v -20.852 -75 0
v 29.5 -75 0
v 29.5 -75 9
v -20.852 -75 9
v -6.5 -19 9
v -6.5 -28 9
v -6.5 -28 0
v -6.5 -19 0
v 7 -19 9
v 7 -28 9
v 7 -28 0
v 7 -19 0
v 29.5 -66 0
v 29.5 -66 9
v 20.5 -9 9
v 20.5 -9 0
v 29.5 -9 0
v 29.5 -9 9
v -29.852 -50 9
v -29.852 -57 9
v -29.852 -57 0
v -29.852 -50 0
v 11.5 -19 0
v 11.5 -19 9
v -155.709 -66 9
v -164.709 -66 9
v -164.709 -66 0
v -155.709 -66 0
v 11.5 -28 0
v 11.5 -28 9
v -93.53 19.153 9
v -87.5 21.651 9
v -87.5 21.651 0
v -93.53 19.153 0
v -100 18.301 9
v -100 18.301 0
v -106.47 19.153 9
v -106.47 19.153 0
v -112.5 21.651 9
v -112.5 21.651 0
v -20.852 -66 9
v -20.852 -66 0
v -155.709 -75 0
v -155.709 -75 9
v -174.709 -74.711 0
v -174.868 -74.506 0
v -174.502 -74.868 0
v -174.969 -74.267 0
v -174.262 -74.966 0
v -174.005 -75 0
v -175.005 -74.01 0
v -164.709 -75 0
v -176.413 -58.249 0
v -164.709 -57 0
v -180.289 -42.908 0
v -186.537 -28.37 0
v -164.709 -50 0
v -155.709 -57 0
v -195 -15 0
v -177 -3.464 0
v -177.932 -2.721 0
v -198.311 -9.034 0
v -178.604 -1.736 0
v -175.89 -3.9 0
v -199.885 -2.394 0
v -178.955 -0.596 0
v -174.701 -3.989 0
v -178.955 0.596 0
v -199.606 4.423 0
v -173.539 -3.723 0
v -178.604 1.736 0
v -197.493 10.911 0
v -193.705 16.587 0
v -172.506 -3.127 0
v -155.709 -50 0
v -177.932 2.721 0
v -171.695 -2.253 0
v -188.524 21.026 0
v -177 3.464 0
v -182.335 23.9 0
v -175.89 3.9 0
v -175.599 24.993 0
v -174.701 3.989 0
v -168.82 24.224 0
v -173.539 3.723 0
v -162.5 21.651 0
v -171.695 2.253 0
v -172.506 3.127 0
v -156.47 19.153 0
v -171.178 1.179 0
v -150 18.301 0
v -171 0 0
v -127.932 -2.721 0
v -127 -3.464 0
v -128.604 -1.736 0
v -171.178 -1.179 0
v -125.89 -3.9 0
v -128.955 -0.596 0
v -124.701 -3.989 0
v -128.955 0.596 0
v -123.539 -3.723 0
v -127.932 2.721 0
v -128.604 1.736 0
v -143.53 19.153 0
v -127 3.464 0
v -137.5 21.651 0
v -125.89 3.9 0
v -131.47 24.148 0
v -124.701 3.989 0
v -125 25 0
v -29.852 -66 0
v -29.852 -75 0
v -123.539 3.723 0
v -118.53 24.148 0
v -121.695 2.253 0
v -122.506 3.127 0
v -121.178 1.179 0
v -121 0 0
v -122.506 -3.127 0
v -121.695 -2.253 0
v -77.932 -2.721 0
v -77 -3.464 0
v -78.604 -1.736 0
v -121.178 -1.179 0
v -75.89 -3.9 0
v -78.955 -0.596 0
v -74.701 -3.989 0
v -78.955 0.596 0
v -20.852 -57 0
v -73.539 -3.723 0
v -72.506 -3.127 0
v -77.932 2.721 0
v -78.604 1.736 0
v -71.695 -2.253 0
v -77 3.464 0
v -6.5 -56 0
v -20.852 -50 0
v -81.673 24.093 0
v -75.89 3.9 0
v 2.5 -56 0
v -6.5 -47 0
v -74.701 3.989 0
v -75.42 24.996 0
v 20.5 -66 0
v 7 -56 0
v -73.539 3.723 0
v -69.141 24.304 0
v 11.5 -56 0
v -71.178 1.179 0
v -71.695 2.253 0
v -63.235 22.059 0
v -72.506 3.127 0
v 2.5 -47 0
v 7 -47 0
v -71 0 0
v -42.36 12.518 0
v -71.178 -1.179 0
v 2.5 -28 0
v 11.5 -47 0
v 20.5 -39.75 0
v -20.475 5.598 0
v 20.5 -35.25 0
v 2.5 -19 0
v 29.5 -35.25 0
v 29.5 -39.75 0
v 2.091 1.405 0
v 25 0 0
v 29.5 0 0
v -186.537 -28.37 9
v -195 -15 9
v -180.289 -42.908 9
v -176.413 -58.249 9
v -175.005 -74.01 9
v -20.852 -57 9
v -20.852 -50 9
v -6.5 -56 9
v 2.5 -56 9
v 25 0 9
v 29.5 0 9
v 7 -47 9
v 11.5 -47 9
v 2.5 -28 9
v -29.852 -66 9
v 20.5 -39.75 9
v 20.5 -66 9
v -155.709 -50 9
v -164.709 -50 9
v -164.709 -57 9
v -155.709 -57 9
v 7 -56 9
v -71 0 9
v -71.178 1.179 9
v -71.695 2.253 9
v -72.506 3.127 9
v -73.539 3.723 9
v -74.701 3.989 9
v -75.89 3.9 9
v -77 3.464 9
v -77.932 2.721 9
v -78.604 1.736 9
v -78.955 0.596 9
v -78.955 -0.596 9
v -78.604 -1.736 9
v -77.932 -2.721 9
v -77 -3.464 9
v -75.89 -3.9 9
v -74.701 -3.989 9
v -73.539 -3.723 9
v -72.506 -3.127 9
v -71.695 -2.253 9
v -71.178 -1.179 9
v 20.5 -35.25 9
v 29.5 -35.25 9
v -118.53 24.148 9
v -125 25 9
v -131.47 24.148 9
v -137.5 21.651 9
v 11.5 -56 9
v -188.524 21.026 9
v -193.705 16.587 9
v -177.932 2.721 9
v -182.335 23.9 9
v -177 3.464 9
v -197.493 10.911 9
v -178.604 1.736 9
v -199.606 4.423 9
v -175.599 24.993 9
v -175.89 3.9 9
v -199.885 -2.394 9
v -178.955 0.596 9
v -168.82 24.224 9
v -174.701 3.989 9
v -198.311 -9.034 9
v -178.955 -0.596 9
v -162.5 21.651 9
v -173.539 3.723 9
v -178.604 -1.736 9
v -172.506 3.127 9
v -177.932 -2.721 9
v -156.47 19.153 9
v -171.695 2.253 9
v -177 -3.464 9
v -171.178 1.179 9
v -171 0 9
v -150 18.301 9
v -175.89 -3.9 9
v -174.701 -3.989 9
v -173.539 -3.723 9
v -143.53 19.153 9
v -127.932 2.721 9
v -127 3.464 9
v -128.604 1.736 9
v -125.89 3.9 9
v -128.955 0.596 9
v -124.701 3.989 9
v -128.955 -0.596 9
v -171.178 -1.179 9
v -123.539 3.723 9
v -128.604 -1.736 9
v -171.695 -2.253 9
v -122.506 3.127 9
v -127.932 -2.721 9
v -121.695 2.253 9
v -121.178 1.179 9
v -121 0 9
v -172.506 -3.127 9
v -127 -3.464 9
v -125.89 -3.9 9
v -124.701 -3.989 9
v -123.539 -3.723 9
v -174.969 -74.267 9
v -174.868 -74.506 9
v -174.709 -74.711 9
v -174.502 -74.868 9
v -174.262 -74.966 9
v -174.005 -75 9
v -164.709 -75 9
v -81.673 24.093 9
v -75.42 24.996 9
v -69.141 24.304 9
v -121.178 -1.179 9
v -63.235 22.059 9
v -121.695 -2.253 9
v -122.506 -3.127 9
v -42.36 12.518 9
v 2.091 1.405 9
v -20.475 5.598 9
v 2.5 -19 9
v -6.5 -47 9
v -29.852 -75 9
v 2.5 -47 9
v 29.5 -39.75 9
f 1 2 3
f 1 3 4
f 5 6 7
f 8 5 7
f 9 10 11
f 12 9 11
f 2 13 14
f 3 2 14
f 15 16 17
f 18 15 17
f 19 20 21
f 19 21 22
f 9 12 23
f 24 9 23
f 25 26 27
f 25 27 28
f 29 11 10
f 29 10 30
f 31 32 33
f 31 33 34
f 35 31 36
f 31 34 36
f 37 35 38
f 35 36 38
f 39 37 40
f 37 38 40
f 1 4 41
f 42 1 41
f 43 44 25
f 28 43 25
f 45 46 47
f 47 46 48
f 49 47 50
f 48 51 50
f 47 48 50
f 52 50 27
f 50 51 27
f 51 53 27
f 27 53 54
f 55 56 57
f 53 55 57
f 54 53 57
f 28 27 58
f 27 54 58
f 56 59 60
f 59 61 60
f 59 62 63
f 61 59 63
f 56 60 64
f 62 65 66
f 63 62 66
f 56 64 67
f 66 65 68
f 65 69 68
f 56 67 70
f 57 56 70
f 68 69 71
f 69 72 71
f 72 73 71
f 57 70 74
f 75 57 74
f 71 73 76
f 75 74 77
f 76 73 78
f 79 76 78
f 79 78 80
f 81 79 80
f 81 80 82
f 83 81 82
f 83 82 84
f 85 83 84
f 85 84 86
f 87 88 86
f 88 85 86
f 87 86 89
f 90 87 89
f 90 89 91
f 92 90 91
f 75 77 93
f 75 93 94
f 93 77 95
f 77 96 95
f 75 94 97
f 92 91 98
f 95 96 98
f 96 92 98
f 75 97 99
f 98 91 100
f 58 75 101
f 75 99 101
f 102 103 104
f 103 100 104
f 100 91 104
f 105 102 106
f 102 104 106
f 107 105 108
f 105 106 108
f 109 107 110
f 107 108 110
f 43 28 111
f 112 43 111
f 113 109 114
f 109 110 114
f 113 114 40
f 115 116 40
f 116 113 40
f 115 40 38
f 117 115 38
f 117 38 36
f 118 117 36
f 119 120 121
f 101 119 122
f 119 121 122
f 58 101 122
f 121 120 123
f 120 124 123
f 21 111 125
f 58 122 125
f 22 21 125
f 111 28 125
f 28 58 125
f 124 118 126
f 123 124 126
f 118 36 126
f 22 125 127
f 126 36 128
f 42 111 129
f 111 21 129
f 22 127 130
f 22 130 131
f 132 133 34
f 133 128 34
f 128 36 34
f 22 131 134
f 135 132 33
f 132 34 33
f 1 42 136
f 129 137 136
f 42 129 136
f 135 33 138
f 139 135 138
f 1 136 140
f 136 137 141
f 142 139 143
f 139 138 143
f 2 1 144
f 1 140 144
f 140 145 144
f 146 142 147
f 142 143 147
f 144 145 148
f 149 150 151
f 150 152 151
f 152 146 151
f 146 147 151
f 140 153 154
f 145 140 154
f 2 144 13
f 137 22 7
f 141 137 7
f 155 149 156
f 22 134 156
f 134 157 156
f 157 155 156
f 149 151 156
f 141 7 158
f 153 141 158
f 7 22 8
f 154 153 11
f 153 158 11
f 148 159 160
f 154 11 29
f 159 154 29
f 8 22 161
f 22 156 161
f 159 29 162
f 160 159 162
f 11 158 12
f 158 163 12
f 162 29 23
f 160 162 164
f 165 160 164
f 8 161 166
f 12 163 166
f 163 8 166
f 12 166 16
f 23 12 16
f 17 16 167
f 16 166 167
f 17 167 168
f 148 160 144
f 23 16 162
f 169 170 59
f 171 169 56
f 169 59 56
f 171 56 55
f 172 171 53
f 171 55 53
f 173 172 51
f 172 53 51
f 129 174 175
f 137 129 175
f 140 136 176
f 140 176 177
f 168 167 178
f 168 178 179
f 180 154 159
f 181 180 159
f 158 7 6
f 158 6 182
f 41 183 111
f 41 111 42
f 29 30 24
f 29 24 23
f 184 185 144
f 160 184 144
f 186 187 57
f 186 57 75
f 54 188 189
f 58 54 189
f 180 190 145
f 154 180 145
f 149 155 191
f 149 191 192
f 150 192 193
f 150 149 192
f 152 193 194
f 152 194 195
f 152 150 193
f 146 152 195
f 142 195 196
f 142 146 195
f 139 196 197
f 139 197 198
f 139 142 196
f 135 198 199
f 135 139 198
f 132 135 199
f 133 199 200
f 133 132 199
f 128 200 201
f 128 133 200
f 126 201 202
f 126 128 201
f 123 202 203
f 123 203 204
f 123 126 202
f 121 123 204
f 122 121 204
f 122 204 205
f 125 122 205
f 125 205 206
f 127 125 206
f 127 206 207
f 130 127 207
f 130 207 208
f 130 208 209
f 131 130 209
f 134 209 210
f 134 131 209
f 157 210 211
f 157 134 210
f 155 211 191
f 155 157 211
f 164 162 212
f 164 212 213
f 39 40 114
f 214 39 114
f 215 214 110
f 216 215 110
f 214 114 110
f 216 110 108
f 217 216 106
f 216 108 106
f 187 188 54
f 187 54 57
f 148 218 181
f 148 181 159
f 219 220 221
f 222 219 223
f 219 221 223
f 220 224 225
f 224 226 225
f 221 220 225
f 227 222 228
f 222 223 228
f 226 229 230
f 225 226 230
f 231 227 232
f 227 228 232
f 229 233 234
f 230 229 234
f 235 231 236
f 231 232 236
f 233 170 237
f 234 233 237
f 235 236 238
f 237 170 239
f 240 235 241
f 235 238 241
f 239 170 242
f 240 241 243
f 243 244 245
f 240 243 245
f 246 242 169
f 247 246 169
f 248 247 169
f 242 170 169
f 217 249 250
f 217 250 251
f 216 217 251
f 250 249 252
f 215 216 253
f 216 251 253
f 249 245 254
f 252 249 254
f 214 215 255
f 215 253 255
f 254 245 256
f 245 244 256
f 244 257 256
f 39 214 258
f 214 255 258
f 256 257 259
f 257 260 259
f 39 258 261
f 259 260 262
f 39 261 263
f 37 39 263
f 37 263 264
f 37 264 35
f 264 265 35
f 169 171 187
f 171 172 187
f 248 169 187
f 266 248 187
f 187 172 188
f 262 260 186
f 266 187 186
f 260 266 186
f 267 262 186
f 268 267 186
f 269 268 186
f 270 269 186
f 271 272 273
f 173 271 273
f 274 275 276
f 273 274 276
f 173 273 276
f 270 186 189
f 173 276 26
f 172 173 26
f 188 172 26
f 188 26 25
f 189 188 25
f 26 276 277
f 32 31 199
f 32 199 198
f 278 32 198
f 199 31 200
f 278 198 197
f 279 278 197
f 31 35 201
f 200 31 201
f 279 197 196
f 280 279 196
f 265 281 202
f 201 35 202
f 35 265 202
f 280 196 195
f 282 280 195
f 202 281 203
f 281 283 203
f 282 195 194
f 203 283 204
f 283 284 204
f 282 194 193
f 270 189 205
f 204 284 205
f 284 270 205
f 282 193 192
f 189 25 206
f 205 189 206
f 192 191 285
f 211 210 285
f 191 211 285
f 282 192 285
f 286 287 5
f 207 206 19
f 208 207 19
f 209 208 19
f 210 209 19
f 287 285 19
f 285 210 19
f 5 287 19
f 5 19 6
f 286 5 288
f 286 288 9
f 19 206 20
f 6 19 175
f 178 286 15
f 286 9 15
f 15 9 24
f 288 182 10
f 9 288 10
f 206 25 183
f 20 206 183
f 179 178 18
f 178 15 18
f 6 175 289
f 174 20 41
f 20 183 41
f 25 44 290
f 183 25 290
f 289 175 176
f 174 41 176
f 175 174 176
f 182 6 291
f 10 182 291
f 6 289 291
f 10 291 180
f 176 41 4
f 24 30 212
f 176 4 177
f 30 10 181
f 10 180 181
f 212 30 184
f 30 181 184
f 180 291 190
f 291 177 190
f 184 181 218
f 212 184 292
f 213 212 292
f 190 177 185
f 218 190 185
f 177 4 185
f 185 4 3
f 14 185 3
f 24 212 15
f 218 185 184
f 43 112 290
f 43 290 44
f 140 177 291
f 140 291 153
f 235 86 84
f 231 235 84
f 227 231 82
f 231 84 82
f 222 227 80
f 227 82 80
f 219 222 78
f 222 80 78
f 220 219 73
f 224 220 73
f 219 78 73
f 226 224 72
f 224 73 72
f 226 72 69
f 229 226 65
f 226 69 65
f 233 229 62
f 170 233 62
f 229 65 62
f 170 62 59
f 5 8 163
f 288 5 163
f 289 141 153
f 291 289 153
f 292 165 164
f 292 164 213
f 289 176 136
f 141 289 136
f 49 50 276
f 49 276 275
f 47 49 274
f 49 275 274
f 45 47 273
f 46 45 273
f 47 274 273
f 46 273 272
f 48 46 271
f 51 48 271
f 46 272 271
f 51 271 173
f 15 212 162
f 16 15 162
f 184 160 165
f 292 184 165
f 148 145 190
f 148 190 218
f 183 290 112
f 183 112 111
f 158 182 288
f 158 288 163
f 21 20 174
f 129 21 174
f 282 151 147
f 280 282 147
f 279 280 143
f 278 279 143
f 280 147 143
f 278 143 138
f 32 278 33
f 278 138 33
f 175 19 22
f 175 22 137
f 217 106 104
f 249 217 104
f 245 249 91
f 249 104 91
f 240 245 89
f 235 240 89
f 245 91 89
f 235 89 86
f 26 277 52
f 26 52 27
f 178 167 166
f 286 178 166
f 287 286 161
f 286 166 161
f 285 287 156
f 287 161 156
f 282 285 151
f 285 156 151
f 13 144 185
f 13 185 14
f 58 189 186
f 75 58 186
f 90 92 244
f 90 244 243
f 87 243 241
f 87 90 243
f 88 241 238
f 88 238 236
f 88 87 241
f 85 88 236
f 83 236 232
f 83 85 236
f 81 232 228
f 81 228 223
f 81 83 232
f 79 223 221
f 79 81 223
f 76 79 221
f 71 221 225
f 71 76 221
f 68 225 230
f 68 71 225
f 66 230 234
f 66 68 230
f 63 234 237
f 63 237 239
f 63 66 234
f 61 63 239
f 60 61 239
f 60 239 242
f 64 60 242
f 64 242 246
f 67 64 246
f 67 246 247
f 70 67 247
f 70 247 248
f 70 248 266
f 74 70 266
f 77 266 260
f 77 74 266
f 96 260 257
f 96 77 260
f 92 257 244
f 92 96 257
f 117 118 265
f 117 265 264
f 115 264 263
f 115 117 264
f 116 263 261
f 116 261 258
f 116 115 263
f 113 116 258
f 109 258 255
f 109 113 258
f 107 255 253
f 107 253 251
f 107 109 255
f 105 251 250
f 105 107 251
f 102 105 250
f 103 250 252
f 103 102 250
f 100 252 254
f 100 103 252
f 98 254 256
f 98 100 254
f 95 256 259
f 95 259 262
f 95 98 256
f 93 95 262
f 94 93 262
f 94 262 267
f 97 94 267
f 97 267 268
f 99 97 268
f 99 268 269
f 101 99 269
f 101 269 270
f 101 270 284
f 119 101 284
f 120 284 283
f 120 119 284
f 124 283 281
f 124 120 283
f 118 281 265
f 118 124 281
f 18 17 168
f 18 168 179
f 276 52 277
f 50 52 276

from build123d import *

# Parameters (mm, degrees)
SKETCH1_R                = 8
SKETCH1_R_2              = 4
BOSS_EXTRUDE1_DEPTH      = 9
BOSS_EXTRUDE1_2_DEPTH    = 9
SKETCH2_R                = 4
BOSS_EXTRUDE3_DEPTH      = 9
FILLET1_R                = 1
CUT_EXTRUDE1_DEPTH       = 214.789616212
SKETCH4_W                = 9
SKETCH4_H                = 27
BOSS_EXTRUDE4_DEPTH      = 75
BOSS_EXTRUDE5_START      = 9
SKETCH5_R                = 25
SKETCH5_R_2              = 4
BOSS_EXTRUDE5_DEPTH      = 9
BOSS_EXTRUDE6_DEPTH      = 4.5
BOSS_EXTRUDE6_DEPTH_BACK = 4.5
BOSS_EXTRUDE7_DEPTH      = 4.5
BOSS_EXTRUDE7_DEPTH_BACK = 4.5
BOSS_EXTRUDE7_START      = -25
SKETCH9_W                = 9
SKETCH9_H                = 7
SKETCH9_H_2              = 9
CUT_EXTRUDE2_DEPTH       = 217.612557346
CUT_EXTRUDE3_DEPTH       = 216.299790989
CUT_EXTRUDE3_DEPTH_BACK  = 216.299790989
CAVITY1_START            = -66
CAVITY1_OUTLINE_W        = 9
CAVITY1_OUTLINE_H        = 9
CAVITY1_DEPTH            = 26.25
CAVITY1_START_2          = -35.25
CAVITY1_2_OUTLINE_W      = 9
CAVITY1_2_OUTLINE_H      = 9
CAVITY1_2_DEPTH          = 26.25
CAVITY1_START_3          = -56
CAVITY1_3_OUTLINE_W      = 4.5
CAVITY1_3_OUTLINE_H      = 9
CAVITY1_3_OUTLINE_W_2    = 9
CAVITY1_3_DEPTH          = 9
CAVITY1_START_4          = -28
CAVITY1_4_OUTLINE_W      = 4.5
CAVITY1_4_OUTLINE_H      = 9
CAVITY1_4_OUTLINE_W_2    = 9
CAVITY1_4_DEPTH          = 9


# Read off the part's stored shape, not the designer's step: Cavity1
with BuildPart() as part:
    # Sketch1 → Boss-Extrude1 (new body)
    with BuildSketch(Plane.XY):
        with Locations((-125, 0)):
            Circle(SKETCH1_R)
        with Locations((-125, 0)):
            Circle(SKETCH1_R_2, mode=Mode.SUBTRACT)
    extrude(amount=BOSS_EXTRUDE1_DEPTH)



with BuildPart() as body_2:
    # Sketch1 → Boss-Extrude1 2 (new body)
    with BuildSketch(Plane.XY):
        with Locations((125, 0)):
            Circle(SKETCH1_R)
        with Locations((125, 0)):
            Circle(SKETCH1_R_2, mode=Mode.SUBTRACT)
    extrude(amount=BOSS_EXTRUDE1_2_DEPTH)


with BuildPart() as part_1:
    add(part.part)

    add(body_2.part)  # Boss-Extrude3 merges body 2
    # Sketch2 → Boss-Extrude3 (add)
    with BuildSketch(Plane.XY):
        with BuildLine():
            Line((-175, -75), (125, -75))
            ThreePointArc((125, -75), (130.131670325, -43.377223009), (145.000000492, -14.999999344))
            ThreePointArc((145.000000492, -14.999999344), (143.981414944, 16.269784471), (113.235294528, 22.058823748))
            ThreePointArc((113.235294528, 22.058823748), (25.000000075, 0), (-63.235294395, 22.058823677))
            ThreePointArc((-63.235294395, 22.058823677), (-75.420498385, 24.996463372), (-87.499999896, 21.650635154))
            ThreePointArc((-87.499999896, 21.650635154), (-99.999999954, 18.301270189), (-112.500000024, 21.650635108))
            ThreePointArc((-112.500000024, 21.650635108), (-124.99999995, 25), (-137.49999989, 21.650635158))
            ThreePointArc((-137.49999989, 21.650635158), (-149.999999954, 18.301270189), (-162.50000003, 21.650635112))
            ThreePointArc((-162.50000003, 21.650635112), (-193.705072901, 16.586749162), (-195.000000551, -14.999999265))
            ThreePointArc((-195.000000551, -14.999999265), (-180.13167034, -43.377222962), (-175, -75))
        make_face()
        with Locations((125, 0)):
            Circle(SKETCH2_R, mode=Mode.SUBTRACT)
        with Locations((-175, 0)):
            Circle(SKETCH2_R, mode=Mode.SUBTRACT)
        with Locations((-125, 0)):
            Circle(SKETCH2_R, mode=Mode.SUBTRACT)
        with Locations((-75, 0)):
            Circle(SKETCH2_R, mode=Mode.SUBTRACT)
    extrude(amount=BOSS_EXTRUDE3_DEPTH)

    # Fillet1
    fillet1_edges = [part_1.edges().sort_by_distance(p)[0] for p in [
        (-175, -75, 4.5),
        (125, -75, 4.5),
    ]]
    fillet(fillet1_edges, radius=FILLET1_R)

    # Sketch3 → Cut-Extrude1 (cut, through all)
    with BuildSketch(Plane.XY):
        Polygon((25, 0), (25, -75), (150, -75), (150, 25), (25, 25), align=None)
    extrude(amount=CUT_EXTRUDE1_DEPTH, mode=Mode.SUBTRACT)

    # Sketch4 → Boss-Extrude4 (add)
    with BuildSketch(Plane.XZ.offset(75)):
        with Locations((25, -4.5)):
            Rectangle(SKETCH4_W, SKETCH4_H)
    extrude(amount=-BOSS_EXTRUDE4_DEPTH)

    # Sketch5 → Boss-Extrude5 (add)
    # profile 1 of 4: a face of its own
    with BuildSketch(Plane(origin=(0, 0, -18), x_dir=(-1, 0, 0), z_dir=(0, 0, -1)).offset(BOSS_EXTRUDE5_START)):
        with BuildLine():
            ThreePointArc((-145.000000304, -14.999999594), (-130.131670275, -43.377223158), (-125, -75))
            Line((-125, -75), (-29.5, -75))
            Line((-29.5, -75), (-29.5, 0))
            Line((-29.5, 0), (-100, 0))
            ThreePointArc((-100, 0), (-117.09430609, -23.717082532), (-145.000000304, -14.999999594))
        make_face()
    # profile 2 of 4: a face of its own
    with BuildSketch(Plane(origin=(0, 0, -18), x_dir=(-1, 0, 0), z_dir=(0, 0, -1)).offset(BOSS_EXTRUDE5_START)):
        with Locations((-125, 0)):
            Circle(SKETCH5_R)
        with Locations((-125, 0)):
            Circle(SKETCH5_R_2, mode=Mode.SUBTRACT)
    # profile 3 of 4: a face of its own
    with BuildSketch(Plane(origin=(0, 0, -18), x_dir=(-1, 0, 0), z_dir=(0, 0, -1)).offset(BOSS_EXTRUDE5_START)):
        Polygon((-29.5, 0), (-29.5, -75), (-20.5, -75), (-20.5, 0), (-25, 0), align=None)
    # profile 4 of 4: a face of its own
    with BuildSketch(Plane(origin=(0, 0, -18), x_dir=(-1, 0, 0), z_dir=(0, 0, -1)).offset(BOSS_EXTRUDE5_START)):
        with BuildLine():
            Line((-100, 0), (-29.5, 0))
            Line((-29.5, 0), (-25, 0))
            ThreePointArc((-25, 0), (-70.475429529, 5.598281181), (-113.235293817, 22.058823369))
            ThreePointArc((-113.235293817, 22.058823369), (-103.56267677, 12.86239374), (-100, 0))
        make_face()
    extrude(amount=-BOSS_EXTRUDE5_DEPTH)

    # Sketch7 → Boss-Extrude6 (add, two sides: drawn at the far end of the back side and taken through both)
    with BuildSketch(Plane(origin=(0, -25, 0), x_dir=(1, 0, 0), z_dir=(0, 1, 0)).offset(-BOSS_EXTRUDE6_DEPTH_BACK)):
        with BuildLine():
            Line((56.5, 18), (29.5, 18))
            Line((29.5, 18), (29.5, -9))
            ThreePointArc((29.5, -9), (48.591883092, -1.091883092), (56.5, 18))
        make_face()
        with BuildLine():
            Line((-6.5, 0), (20.5, 0))
            Line((20.5, 0), (20.5, 27))
            ThreePointArc((20.5, 27), (1.408116908, 19.091883092), (-6.5, 0))
        make_face()
    extrude(amount=BOSS_EXTRUDE6_DEPTH + BOSS_EXTRUDE6_DEPTH_BACK)

    # Sketch7<3> → Boss-Extrude7 (add, two sides: drawn at the far end of the back side and taken through both)
    with BuildSketch(Plane(origin=(0, -25, 0), x_dir=(1, 0, 0), z_dir=(0, 1, 0)).offset(BOSS_EXTRUDE7_START - BOSS_EXTRUDE7_DEPTH_BACK)):
        with BuildLine():
            Line((56.5, 18), (29.5, 18))
            Line((29.5, 18), (29.5, -9))
            ThreePointArc((29.5, -9), (48.591883092, -1.091883092), (56.5, 18))
        make_face()
        with BuildLine():
            Line((-6.5, 0), (20.5, 0))
            Line((20.5, 0), (20.5, 27))
            ThreePointArc((20.5, 27), (1.408116908, 19.091883092), (-6.5, 0))
        make_face()
    extrude(amount=BOSS_EXTRUDE7_DEPTH + BOSS_EXTRUDE7_DEPTH_BACK)

    # Sketch9 → Cut-Extrude2 (cut, through all)
    with BuildSketch(Plane.XY.offset(9)):
        with Locations((-160.208548161, -53.5)):
            Rectangle(SKETCH9_W, SKETCH9_H)
        with Locations((-160.208548161, -70.5)):
            Rectangle(SKETCH9_W, SKETCH9_H_2)
        with Locations((-25.351798772, -53.5)):
            Rectangle(SKETCH9_W, SKETCH9_H)
        with Locations((-25.351798772, -70.5)):
            Rectangle(SKETCH9_W, SKETCH9_H_2)
        with Locations((109.504950616, -53.5)):
            Rectangle(SKETCH9_W, SKETCH9_H)
        with Locations((109.504950616, -70.5)):
            Rectangle(SKETCH9_W, SKETCH9_H_2)
    extrude(amount=-CUT_EXTRUDE2_DEPTH, mode=Mode.SUBTRACT)

    # Sketch10 → Cut-Extrude3 (cut, two sides: drawn at the far end of the back side and taken through both)
    with BuildSketch(Plane(origin=(0, 0, 0), x_dir=(1, 0, 0), z_dir=(0, 1, 0)).offset(-CUT_EXTRUDE3_DEPTH_BACK)):
        Polygon((-200, 27), (-200, 0), (29.5, 0), (29.5, -9), (150, -9), (150, 18), (20.5, 18), (20.5, 27), align=None)
    extrude(amount=CUT_EXTRUDE3_DEPTH + CUT_EXTRUDE3_DEPTH_BACK, mode=Mode.SUBTRACT)


with BuildPart() as cut_extrude3_kept_piece:
    # of the separate pieces the step leaves, the one the design keeps (cut_extrude3_pieces_kept)
    add(part_1.part.solids().sort_by_distance((-175.0049016, -74.00990099, 0))[0])

    # Cavity1 outline → Cavity1 (cut)
    with BuildSketch(Plane(origin=(0, 0, 0), x_dir=(1, 0, 0), z_dir=(0, 1, 0)).offset(CAVITY1_START)):
        with Locations((25, -4.5)):
            Rectangle(CAVITY1_OUTLINE_W, CAVITY1_OUTLINE_H)
    extrude(amount=CAVITY1_DEPTH, mode=Mode.SUBTRACT)

    # Cavity1 2 outline → Cavity1 2 (cut)
    with BuildSketch(Plane(origin=(0, 0, 0), x_dir=(1, 0, 0), z_dir=(0, 1, 0)).offset(CAVITY1_START_2)):
        with Locations((25, -4.5)):
            Rectangle(CAVITY1_2_OUTLINE_W, CAVITY1_2_OUTLINE_H)
    extrude(amount=CAVITY1_2_DEPTH, mode=Mode.SUBTRACT)

    # Cavity1 3 outline → Cavity1 3 (cut)
    with BuildSketch(Plane(origin=(0, 0, 0), x_dir=(1, 0, 0), z_dir=(0, 1, 0)).offset(CAVITY1_START_3)):
        with Locations((9.25, -4.5)):
            Rectangle(CAVITY1_3_OUTLINE_W, CAVITY1_3_OUTLINE_H)
        with Locations((-2, -4.5)):
            Rectangle(CAVITY1_3_OUTLINE_W_2, CAVITY1_3_OUTLINE_H)
    extrude(amount=CAVITY1_3_DEPTH, mode=Mode.SUBTRACT)

    # Cavity1 4 outline → Cavity1 4 (cut)
    with BuildSketch(Plane(origin=(0, 0, 0), x_dir=(1, 0, 0), z_dir=(0, 1, 0)).offset(CAVITY1_START_4)):
        with Locations((9.25, -4.5)):
            Rectangle(CAVITY1_4_OUTLINE_W, CAVITY1_4_OUTLINE_H)
        with Locations((-2, -4.5)):
            Rectangle(CAVITY1_4_OUTLINE_W_2, CAVITY1_4_OUTLINE_H)
    extrude(amount=CAVITY1_4_DEPTH, mode=Mode.SUBTRACT)


solid = cut_extrude3_kept_piece.part
